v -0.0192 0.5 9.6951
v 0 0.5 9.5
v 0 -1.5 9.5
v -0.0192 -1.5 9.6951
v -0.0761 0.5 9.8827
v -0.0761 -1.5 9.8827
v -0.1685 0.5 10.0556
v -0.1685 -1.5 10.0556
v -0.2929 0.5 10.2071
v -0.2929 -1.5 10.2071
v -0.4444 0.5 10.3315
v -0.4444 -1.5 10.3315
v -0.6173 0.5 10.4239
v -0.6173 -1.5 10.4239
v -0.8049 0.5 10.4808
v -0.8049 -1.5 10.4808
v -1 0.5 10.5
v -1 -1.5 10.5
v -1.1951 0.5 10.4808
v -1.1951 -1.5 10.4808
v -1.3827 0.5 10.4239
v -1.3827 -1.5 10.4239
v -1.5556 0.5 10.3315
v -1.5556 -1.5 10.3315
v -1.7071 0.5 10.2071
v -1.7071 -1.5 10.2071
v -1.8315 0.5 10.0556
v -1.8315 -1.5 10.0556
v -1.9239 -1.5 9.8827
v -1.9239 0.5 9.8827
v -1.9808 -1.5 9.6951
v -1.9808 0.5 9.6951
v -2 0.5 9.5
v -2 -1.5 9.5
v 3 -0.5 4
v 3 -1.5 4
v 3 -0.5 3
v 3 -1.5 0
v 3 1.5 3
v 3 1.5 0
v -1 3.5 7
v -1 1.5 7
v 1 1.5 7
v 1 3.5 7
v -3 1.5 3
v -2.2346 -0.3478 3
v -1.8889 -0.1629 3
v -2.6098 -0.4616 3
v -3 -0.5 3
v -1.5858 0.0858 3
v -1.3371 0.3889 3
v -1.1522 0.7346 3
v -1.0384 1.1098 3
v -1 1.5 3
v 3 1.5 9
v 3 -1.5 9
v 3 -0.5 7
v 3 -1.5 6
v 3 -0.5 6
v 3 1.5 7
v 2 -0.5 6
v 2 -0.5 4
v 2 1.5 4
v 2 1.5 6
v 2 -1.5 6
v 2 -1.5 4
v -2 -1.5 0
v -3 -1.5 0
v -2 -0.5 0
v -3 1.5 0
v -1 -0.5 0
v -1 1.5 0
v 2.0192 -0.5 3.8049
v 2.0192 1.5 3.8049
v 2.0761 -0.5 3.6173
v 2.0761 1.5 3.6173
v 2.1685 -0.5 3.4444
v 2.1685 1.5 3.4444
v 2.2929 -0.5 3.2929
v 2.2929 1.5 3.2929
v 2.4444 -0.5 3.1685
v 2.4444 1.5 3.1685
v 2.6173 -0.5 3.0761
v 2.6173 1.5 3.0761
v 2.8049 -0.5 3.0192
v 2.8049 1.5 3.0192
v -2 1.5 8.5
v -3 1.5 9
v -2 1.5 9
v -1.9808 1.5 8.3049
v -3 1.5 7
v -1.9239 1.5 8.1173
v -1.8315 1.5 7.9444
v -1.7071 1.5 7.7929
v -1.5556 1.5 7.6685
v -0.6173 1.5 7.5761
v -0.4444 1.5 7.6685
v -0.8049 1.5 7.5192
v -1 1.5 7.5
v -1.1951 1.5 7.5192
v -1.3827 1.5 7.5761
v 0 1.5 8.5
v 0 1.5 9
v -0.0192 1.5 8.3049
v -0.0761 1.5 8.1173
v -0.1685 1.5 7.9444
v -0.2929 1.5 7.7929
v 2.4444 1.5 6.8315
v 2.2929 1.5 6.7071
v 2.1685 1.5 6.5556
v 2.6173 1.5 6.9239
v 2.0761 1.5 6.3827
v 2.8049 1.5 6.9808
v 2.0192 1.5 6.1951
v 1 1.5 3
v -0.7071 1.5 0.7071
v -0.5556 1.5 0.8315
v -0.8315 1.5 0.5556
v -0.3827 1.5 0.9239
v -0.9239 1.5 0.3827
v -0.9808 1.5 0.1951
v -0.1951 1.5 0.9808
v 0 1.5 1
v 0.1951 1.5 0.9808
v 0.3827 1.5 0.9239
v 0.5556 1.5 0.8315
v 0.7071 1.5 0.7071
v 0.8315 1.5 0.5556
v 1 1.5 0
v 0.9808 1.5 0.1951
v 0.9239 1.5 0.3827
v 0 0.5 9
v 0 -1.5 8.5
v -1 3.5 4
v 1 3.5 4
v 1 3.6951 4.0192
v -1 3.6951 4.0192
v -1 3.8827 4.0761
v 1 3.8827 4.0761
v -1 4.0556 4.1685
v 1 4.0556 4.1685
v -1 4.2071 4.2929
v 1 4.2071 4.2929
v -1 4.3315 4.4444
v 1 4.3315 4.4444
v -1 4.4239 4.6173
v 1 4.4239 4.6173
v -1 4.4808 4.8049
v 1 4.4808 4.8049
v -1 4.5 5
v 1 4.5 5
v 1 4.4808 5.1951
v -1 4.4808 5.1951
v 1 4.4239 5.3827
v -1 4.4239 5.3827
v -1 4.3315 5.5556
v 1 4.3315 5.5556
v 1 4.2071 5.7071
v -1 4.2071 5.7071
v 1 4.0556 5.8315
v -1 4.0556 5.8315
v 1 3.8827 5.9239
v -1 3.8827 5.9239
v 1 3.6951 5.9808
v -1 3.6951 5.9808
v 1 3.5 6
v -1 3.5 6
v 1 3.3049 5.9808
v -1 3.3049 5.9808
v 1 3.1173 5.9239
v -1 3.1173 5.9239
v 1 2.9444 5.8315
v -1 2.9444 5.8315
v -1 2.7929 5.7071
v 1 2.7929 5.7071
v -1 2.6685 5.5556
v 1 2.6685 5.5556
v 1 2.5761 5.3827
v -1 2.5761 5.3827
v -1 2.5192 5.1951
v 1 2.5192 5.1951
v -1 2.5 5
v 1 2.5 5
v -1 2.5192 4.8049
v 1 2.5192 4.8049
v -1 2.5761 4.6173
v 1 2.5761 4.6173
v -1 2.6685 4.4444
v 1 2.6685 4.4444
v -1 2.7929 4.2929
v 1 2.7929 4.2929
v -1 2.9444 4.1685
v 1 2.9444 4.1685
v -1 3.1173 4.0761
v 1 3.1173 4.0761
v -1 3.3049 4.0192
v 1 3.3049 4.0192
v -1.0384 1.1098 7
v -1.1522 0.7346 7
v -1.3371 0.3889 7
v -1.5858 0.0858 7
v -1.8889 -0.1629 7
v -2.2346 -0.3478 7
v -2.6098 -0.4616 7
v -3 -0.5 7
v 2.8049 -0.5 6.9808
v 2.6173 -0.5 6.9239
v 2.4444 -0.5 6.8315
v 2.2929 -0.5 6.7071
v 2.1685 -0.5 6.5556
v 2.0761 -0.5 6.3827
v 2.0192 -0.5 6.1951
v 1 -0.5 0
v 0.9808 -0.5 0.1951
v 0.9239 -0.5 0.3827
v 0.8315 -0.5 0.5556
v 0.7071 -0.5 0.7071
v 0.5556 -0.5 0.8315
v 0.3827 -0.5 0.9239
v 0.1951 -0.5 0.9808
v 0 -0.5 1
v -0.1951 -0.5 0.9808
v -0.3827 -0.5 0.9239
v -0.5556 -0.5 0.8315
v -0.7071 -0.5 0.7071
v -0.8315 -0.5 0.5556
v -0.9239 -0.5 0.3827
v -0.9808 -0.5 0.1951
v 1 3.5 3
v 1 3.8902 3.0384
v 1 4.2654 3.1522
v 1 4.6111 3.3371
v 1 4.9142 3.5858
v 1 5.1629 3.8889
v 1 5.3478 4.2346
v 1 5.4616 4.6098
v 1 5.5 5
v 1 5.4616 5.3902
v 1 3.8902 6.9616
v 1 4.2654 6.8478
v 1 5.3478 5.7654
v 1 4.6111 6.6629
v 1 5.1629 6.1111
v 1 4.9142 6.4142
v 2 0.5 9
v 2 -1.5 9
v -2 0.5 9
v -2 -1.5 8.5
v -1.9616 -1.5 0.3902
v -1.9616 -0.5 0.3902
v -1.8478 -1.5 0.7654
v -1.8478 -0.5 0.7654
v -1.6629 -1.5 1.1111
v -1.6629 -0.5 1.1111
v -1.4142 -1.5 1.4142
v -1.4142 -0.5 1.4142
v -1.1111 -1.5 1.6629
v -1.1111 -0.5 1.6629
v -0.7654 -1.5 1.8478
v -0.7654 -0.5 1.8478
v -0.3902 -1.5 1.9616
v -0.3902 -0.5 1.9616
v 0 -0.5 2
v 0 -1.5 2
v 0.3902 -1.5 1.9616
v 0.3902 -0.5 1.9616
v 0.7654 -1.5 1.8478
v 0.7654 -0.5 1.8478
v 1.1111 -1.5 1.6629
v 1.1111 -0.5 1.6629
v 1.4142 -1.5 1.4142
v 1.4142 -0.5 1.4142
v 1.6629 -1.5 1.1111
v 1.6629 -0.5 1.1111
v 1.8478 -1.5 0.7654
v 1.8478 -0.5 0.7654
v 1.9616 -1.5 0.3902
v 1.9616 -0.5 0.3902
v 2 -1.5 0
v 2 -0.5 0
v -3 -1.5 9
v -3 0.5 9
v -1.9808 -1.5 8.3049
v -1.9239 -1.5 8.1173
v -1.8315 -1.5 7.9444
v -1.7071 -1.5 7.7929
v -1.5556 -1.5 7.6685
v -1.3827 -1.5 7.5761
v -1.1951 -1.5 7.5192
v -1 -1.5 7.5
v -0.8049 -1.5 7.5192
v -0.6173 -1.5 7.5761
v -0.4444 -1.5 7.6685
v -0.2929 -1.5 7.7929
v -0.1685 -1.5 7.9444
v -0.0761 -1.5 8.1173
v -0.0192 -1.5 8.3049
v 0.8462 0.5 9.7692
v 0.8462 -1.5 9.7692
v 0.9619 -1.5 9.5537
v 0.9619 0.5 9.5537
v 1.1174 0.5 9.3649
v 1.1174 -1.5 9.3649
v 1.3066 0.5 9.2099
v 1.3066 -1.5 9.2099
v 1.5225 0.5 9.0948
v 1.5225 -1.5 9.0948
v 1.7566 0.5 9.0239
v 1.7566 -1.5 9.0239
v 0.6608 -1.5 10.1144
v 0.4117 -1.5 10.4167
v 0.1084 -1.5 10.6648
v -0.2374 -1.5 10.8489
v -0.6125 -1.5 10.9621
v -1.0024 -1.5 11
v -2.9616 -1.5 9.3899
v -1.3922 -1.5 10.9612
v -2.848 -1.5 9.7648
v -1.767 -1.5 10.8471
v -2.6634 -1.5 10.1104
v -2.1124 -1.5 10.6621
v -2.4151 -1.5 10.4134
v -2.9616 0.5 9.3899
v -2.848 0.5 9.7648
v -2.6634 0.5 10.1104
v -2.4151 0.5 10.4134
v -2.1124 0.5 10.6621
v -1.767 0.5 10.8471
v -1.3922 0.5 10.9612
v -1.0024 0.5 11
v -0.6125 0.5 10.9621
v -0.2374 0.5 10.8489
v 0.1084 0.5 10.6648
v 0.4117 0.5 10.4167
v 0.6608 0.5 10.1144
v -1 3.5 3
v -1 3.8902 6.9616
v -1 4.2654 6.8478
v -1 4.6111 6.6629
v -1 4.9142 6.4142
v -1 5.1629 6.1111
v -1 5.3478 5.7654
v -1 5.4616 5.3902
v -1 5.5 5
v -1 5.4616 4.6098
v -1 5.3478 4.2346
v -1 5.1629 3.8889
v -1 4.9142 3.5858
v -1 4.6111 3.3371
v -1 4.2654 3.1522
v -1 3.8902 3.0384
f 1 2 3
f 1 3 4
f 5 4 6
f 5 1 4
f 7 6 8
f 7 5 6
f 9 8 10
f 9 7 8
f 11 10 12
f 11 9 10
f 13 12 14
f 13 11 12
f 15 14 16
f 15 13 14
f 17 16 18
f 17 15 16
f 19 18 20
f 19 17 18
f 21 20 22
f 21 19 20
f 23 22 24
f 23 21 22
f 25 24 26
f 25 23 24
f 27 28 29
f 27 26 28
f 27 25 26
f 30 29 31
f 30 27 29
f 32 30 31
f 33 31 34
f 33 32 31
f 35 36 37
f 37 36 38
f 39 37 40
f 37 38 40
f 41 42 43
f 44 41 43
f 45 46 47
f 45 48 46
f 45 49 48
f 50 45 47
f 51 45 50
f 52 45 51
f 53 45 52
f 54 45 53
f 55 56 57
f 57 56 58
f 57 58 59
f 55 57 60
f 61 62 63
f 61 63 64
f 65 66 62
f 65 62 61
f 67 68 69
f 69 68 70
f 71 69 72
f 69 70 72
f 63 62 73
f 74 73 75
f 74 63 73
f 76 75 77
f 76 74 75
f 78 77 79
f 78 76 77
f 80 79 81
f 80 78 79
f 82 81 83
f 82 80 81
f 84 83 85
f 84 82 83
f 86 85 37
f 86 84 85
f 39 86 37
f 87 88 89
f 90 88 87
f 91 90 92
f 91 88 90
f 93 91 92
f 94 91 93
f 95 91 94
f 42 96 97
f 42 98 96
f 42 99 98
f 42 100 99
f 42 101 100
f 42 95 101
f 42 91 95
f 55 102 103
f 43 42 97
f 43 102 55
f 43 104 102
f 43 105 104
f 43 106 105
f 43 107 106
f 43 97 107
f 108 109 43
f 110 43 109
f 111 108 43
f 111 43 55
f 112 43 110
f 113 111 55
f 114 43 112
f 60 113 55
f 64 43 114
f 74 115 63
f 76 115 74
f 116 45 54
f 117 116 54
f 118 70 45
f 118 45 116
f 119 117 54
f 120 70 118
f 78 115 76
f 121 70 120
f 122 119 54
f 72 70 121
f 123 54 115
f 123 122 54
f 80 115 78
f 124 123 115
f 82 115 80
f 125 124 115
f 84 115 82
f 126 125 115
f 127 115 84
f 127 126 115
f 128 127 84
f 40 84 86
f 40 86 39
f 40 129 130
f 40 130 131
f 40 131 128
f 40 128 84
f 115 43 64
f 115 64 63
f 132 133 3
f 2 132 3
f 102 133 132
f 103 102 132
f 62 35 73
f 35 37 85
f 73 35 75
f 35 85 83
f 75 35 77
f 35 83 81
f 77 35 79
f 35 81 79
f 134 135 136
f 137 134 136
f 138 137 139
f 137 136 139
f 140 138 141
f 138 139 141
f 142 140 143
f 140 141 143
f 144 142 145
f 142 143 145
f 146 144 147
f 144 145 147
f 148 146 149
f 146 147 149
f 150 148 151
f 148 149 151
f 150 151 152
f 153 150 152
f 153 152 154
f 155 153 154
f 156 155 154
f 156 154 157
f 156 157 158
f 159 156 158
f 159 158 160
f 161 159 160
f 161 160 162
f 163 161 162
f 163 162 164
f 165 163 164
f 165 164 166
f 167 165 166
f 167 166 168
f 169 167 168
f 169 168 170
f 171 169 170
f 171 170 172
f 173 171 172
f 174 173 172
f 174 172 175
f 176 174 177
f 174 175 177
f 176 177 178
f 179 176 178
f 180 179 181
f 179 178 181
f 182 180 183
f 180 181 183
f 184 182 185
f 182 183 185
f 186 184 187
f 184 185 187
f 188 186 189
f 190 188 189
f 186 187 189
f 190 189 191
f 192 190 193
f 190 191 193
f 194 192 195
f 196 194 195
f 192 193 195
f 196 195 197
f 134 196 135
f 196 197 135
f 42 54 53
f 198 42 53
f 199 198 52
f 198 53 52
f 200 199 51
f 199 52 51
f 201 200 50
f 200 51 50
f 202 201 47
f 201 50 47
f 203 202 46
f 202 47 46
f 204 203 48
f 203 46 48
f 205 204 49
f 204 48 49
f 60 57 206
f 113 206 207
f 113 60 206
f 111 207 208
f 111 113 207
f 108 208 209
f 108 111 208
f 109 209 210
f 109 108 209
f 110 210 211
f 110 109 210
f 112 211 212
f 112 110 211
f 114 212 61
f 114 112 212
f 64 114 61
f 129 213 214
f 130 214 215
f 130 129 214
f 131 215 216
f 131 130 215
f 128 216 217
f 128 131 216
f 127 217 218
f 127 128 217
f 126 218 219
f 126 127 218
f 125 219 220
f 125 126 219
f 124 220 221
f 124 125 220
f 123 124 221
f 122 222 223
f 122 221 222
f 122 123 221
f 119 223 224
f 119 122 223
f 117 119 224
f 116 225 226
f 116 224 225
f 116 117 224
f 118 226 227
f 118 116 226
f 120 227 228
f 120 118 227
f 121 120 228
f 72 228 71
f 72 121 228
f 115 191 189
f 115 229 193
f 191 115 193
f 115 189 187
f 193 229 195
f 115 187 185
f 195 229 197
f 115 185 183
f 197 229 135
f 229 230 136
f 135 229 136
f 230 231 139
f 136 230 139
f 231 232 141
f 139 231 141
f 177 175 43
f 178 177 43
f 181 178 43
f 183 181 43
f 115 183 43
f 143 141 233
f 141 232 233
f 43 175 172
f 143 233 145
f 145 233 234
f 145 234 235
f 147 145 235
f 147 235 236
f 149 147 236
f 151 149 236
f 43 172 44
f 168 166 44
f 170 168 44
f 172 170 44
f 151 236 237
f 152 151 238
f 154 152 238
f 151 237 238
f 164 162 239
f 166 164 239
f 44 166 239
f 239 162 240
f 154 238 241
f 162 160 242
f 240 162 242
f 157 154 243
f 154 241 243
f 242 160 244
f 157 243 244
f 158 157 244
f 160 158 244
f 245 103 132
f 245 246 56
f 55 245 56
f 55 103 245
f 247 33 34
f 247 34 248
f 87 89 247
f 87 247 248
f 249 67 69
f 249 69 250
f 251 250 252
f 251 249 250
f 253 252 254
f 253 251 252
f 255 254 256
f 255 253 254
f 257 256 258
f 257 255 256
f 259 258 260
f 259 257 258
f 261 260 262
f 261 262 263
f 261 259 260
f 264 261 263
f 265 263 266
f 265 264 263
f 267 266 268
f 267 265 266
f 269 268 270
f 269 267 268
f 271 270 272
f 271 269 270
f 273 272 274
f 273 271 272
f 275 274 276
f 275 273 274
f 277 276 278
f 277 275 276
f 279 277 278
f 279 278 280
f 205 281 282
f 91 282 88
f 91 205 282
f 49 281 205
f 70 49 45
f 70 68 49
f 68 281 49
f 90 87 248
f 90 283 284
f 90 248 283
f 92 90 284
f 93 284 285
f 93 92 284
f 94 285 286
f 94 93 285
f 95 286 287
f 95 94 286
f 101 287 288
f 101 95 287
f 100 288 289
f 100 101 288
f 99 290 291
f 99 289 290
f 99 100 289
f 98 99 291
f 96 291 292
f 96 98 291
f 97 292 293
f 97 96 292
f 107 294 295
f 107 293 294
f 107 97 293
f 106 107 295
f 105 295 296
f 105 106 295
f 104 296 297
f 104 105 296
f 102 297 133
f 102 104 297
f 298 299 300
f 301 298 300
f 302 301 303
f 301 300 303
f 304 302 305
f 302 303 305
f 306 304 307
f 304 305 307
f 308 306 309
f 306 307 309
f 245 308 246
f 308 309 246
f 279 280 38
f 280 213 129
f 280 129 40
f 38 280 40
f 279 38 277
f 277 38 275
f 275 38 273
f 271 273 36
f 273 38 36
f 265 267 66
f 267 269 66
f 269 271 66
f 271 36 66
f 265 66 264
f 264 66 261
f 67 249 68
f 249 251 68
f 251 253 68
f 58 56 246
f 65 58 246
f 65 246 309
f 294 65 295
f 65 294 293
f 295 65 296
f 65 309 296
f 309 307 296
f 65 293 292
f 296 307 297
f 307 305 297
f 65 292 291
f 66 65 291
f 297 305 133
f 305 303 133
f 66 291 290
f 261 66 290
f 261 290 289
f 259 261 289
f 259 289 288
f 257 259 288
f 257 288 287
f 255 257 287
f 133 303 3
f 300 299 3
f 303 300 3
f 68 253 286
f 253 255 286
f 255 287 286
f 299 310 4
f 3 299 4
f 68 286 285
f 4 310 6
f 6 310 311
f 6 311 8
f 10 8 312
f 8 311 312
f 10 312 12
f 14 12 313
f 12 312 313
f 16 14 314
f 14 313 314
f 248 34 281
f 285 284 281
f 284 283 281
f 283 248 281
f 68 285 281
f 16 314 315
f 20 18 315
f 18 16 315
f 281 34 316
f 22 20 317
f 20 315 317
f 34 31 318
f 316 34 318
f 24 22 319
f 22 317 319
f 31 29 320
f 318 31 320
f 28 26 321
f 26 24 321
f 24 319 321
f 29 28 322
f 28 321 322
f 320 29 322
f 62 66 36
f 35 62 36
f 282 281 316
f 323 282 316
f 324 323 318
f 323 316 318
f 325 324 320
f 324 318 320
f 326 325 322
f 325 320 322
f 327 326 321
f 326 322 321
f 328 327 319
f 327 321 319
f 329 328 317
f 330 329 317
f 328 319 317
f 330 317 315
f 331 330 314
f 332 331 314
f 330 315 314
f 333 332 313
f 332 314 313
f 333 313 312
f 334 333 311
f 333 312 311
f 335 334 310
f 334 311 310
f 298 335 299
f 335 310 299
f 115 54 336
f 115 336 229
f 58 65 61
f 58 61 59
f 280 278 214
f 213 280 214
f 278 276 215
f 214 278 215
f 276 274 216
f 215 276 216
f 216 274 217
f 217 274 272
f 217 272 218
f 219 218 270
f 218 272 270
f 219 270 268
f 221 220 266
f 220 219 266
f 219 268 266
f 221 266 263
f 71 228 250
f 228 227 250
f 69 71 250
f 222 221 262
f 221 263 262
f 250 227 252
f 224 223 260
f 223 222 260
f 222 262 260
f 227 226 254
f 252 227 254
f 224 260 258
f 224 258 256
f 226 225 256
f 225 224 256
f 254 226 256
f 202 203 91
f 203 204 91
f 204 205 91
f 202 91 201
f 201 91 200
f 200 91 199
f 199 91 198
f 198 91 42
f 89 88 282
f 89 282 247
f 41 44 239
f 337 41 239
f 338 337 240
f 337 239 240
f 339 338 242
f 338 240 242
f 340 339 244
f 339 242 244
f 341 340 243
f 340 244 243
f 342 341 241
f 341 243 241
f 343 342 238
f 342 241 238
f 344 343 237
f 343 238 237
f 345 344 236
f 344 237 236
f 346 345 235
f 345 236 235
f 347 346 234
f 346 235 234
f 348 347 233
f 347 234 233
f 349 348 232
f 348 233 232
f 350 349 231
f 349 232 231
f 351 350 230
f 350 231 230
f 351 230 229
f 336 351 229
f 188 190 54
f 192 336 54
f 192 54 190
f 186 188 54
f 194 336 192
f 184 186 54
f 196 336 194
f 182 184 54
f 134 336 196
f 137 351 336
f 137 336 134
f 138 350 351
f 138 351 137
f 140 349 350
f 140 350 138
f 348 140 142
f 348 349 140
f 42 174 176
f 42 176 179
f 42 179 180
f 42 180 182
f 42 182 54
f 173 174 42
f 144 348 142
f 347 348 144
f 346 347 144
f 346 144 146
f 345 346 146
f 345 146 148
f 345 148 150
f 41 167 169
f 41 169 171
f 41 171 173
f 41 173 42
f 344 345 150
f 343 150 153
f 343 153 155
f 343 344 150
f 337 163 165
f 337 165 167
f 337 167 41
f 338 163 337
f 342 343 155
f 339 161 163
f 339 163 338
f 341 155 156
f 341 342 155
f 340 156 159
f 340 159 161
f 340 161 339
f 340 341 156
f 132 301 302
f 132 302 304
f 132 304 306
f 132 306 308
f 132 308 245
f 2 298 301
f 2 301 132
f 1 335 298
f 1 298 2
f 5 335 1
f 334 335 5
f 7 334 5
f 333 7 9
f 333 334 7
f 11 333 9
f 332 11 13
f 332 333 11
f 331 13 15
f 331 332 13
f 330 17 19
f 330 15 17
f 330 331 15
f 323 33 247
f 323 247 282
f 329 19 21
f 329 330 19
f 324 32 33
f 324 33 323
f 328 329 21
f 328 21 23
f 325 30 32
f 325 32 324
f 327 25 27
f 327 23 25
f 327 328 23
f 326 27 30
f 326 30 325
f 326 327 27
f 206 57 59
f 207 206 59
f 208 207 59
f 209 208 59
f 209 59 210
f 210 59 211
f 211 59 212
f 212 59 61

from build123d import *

# Parameters (mm, degrees)
SKETCH1_W           = 6
SKETCH1_H           = 3
BOSS_EXTRUDE1_DEPTH = 9
BOSS_EXTRUDE2_DEPTH = 2
CUT_EXTRUDE1_DEPTH  = 2.5
SKETCH4_W           = 1
SKETCH4_H           = 2
CUT_EXTRUDE2_DEPTH  = 1
CUT_EXTRUDE3_DEPTH  = 2
CUT_EXTRUDE4_DEPTH  = 1
CUT_EXTRUDE5_DEPTH  = 4
SKETCH8_W           = 2
SKETCH8_H           = 4
BOSS_EXTRUDE3_DEPTH = 2
BOSS_EXTRUDE4_DEPTH = 2
SKETCH10_R          = 1
CUT_EXTRUDE6_DEPTH  = 5
SKETCH11_W          = 2
SKETCH11_H          = 4
CUT_EXTRUDE7_DEPTH  = 2
BOSS_EXTRUDE5_DEPTH = 4


with BuildPart() as part:
    # Sketch1 → Boss-Extrude1 (new body)
    with BuildSketch(Plane.XY):
        Rectangle(SKETCH1_W, SKETCH1_H)
    extrude(amount=BOSS_EXTRUDE1_DEPTH)

    # Sketch2 → Boss-Extrude2 (add)
    with BuildSketch(Plane.XZ.offset(1.5)):
        with BuildLine():
            Line((2, 9), (-3, 9))
            ThreePointArc((-3, 9), (-1.39223227, 10.961161351), (0.846153846, 9.769230769))
            ThreePointArc((0.846153846, 9.769230769), (1.306624755, 9.209937132), (2, 9))
        make_face()
    extrude(amount=-BOSS_EXTRUDE2_DEPTH)

    # Sketch3 → Cut-Extrude1 (cut, symmetric)
    with BuildSketch(Plane(origin=(0, 0.5, 0), x_dir=(1, 0, 0), z_dir=(0, 1, 0))):
        with BuildLine():
            Line((-2, -9.5), (-2, -8.5))
            ThreePointArc((-2, -8.5), (-1, -7.5), (0, -8.5))
            Line((0, -8.5), (0, -9.5))
            ThreePointArc((0, -9.5), (-1, -10.5), (-2, -9.5))
        make_face()
    extrude(amount=CUT_EXTRUDE1_DEPTH, both=True, mode=Mode.SUBTRACT)

    # Sketch4 → Cut-Extrude2 (cut)
    with BuildSketch(Plane.XZ.offset(1.5)):
        with Locations((2.5, 5)):
            Rectangle(SKETCH4_W, SKETCH4_H)
    extrude(amount=-CUT_EXTRUDE2_DEPTH, mode=Mode.SUBTRACT)

    # Sketch5 → Cut-Extrude3 (cut)
    with BuildSketch(Plane(origin=(0, 1.5, 0), x_dir=(1, 0, 0), z_dir=(0, 1, 0))):
        with BuildLine():
            Line((4, -4), (4, -6))
            ThreePointArc((4, -6), (3, -7), (2, -6))
            Line((2, -6), (2, -4))
            ThreePointArc((2, -4), (3, -3), (4, -4))
        make_face()
    extrude(amount=-CUT_EXTRUDE3_DEPTH, mode=Mode.SUBTRACT)

    # Sketch6 → Cut-Extrude4 (cut)
    with BuildSketch(Plane.XZ.offset(1.5)):
        with BuildLine():
            Line((2, 0), (-2, 0))
            ThreePointArc((-2, 0), (0, 2), (2, 0))
        make_face()
    extrude(amount=-CUT_EXTRUDE4_DEPTH, mode=Mode.SUBTRACT)

    # Sketch7 → Cut-Extrude5 (cut, through all)
    with BuildSketch(Plane(origin=(0, 1.5, 0), x_dir=(1, 0, 0), z_dir=(0, 1, 0))):
        with BuildLine():
            Line((-1, 0), (1, 0))
            ThreePointArc((1, 0), (0, -1), (-1, 0))
        make_face()
    extrude(amount=-CUT_EXTRUDE5_DEPTH, mode=Mode.SUBTRACT)

    # Sketch8 → Boss-Extrude3 (add)
    with BuildSketch(Plane(origin=(0, 1.5, 0), x_dir=(1, 0, 0), z_dir=(0, 1, 0))):
        with Locations((0, -5)):
            Rectangle(SKETCH8_W, SKETCH8_H)
    extrude(amount=BOSS_EXTRUDE3_DEPTH)

    # Sketch9 → Boss-Extrude4 (add)
    with BuildSketch(Plane(origin=(1, 0, 0), x_dir=(0, 0, -1), z_dir=(1, 0, 0))):
        with BuildLine():
            Line((-3, 3.5), (-7, 3.5))
            ThreePointArc((-7, 3.5), (-5, 5.5), (-3, 3.5))
        make_face()
    extrude(amount=-BOSS_EXTRUDE4_DEPTH)

    # Sketch10 → Cut-Extrude6 (cut, through all)
    with BuildSketch(Plane(origin=(1, 0, 0), x_dir=(0, 0, -1), z_dir=(1, 0, 0))):
        with Locations((-5, 3.5)):
            Circle(SKETCH10_R)
    extrude(amount=-CUT_EXTRUDE6_DEPTH, mode=Mode.SUBTRACT)

    # Sketch11 → Cut-Extrude7 (cut)
    with BuildSketch(Plane(origin=(0, 1.5, 0), x_dir=(1, 0, 0), z_dir=(0, 1, 0))):
        with Locations((-2, -5)):
            Rectangle(SKETCH11_W, SKETCH11_H)
    extrude(amount=-CUT_EXTRUDE7_DEPTH, mode=Mode.SUBTRACT)

    # Sketch12 → Boss-Extrude5 (add)
    with BuildSketch(Plane.XY.offset(3)):
        with BuildLine():
            ThreePointArc((-1, 1.5), (-1.585786438, 0.085786438), (-3, -0.5))
            Line((-3, -0.5), (-1, -0.5))
            Line((-1, -0.5), (-1, 1.5))
        make_face()
    extrude(amount=BOSS_EXTRUDE5_DEPTH)


solid = part.part
